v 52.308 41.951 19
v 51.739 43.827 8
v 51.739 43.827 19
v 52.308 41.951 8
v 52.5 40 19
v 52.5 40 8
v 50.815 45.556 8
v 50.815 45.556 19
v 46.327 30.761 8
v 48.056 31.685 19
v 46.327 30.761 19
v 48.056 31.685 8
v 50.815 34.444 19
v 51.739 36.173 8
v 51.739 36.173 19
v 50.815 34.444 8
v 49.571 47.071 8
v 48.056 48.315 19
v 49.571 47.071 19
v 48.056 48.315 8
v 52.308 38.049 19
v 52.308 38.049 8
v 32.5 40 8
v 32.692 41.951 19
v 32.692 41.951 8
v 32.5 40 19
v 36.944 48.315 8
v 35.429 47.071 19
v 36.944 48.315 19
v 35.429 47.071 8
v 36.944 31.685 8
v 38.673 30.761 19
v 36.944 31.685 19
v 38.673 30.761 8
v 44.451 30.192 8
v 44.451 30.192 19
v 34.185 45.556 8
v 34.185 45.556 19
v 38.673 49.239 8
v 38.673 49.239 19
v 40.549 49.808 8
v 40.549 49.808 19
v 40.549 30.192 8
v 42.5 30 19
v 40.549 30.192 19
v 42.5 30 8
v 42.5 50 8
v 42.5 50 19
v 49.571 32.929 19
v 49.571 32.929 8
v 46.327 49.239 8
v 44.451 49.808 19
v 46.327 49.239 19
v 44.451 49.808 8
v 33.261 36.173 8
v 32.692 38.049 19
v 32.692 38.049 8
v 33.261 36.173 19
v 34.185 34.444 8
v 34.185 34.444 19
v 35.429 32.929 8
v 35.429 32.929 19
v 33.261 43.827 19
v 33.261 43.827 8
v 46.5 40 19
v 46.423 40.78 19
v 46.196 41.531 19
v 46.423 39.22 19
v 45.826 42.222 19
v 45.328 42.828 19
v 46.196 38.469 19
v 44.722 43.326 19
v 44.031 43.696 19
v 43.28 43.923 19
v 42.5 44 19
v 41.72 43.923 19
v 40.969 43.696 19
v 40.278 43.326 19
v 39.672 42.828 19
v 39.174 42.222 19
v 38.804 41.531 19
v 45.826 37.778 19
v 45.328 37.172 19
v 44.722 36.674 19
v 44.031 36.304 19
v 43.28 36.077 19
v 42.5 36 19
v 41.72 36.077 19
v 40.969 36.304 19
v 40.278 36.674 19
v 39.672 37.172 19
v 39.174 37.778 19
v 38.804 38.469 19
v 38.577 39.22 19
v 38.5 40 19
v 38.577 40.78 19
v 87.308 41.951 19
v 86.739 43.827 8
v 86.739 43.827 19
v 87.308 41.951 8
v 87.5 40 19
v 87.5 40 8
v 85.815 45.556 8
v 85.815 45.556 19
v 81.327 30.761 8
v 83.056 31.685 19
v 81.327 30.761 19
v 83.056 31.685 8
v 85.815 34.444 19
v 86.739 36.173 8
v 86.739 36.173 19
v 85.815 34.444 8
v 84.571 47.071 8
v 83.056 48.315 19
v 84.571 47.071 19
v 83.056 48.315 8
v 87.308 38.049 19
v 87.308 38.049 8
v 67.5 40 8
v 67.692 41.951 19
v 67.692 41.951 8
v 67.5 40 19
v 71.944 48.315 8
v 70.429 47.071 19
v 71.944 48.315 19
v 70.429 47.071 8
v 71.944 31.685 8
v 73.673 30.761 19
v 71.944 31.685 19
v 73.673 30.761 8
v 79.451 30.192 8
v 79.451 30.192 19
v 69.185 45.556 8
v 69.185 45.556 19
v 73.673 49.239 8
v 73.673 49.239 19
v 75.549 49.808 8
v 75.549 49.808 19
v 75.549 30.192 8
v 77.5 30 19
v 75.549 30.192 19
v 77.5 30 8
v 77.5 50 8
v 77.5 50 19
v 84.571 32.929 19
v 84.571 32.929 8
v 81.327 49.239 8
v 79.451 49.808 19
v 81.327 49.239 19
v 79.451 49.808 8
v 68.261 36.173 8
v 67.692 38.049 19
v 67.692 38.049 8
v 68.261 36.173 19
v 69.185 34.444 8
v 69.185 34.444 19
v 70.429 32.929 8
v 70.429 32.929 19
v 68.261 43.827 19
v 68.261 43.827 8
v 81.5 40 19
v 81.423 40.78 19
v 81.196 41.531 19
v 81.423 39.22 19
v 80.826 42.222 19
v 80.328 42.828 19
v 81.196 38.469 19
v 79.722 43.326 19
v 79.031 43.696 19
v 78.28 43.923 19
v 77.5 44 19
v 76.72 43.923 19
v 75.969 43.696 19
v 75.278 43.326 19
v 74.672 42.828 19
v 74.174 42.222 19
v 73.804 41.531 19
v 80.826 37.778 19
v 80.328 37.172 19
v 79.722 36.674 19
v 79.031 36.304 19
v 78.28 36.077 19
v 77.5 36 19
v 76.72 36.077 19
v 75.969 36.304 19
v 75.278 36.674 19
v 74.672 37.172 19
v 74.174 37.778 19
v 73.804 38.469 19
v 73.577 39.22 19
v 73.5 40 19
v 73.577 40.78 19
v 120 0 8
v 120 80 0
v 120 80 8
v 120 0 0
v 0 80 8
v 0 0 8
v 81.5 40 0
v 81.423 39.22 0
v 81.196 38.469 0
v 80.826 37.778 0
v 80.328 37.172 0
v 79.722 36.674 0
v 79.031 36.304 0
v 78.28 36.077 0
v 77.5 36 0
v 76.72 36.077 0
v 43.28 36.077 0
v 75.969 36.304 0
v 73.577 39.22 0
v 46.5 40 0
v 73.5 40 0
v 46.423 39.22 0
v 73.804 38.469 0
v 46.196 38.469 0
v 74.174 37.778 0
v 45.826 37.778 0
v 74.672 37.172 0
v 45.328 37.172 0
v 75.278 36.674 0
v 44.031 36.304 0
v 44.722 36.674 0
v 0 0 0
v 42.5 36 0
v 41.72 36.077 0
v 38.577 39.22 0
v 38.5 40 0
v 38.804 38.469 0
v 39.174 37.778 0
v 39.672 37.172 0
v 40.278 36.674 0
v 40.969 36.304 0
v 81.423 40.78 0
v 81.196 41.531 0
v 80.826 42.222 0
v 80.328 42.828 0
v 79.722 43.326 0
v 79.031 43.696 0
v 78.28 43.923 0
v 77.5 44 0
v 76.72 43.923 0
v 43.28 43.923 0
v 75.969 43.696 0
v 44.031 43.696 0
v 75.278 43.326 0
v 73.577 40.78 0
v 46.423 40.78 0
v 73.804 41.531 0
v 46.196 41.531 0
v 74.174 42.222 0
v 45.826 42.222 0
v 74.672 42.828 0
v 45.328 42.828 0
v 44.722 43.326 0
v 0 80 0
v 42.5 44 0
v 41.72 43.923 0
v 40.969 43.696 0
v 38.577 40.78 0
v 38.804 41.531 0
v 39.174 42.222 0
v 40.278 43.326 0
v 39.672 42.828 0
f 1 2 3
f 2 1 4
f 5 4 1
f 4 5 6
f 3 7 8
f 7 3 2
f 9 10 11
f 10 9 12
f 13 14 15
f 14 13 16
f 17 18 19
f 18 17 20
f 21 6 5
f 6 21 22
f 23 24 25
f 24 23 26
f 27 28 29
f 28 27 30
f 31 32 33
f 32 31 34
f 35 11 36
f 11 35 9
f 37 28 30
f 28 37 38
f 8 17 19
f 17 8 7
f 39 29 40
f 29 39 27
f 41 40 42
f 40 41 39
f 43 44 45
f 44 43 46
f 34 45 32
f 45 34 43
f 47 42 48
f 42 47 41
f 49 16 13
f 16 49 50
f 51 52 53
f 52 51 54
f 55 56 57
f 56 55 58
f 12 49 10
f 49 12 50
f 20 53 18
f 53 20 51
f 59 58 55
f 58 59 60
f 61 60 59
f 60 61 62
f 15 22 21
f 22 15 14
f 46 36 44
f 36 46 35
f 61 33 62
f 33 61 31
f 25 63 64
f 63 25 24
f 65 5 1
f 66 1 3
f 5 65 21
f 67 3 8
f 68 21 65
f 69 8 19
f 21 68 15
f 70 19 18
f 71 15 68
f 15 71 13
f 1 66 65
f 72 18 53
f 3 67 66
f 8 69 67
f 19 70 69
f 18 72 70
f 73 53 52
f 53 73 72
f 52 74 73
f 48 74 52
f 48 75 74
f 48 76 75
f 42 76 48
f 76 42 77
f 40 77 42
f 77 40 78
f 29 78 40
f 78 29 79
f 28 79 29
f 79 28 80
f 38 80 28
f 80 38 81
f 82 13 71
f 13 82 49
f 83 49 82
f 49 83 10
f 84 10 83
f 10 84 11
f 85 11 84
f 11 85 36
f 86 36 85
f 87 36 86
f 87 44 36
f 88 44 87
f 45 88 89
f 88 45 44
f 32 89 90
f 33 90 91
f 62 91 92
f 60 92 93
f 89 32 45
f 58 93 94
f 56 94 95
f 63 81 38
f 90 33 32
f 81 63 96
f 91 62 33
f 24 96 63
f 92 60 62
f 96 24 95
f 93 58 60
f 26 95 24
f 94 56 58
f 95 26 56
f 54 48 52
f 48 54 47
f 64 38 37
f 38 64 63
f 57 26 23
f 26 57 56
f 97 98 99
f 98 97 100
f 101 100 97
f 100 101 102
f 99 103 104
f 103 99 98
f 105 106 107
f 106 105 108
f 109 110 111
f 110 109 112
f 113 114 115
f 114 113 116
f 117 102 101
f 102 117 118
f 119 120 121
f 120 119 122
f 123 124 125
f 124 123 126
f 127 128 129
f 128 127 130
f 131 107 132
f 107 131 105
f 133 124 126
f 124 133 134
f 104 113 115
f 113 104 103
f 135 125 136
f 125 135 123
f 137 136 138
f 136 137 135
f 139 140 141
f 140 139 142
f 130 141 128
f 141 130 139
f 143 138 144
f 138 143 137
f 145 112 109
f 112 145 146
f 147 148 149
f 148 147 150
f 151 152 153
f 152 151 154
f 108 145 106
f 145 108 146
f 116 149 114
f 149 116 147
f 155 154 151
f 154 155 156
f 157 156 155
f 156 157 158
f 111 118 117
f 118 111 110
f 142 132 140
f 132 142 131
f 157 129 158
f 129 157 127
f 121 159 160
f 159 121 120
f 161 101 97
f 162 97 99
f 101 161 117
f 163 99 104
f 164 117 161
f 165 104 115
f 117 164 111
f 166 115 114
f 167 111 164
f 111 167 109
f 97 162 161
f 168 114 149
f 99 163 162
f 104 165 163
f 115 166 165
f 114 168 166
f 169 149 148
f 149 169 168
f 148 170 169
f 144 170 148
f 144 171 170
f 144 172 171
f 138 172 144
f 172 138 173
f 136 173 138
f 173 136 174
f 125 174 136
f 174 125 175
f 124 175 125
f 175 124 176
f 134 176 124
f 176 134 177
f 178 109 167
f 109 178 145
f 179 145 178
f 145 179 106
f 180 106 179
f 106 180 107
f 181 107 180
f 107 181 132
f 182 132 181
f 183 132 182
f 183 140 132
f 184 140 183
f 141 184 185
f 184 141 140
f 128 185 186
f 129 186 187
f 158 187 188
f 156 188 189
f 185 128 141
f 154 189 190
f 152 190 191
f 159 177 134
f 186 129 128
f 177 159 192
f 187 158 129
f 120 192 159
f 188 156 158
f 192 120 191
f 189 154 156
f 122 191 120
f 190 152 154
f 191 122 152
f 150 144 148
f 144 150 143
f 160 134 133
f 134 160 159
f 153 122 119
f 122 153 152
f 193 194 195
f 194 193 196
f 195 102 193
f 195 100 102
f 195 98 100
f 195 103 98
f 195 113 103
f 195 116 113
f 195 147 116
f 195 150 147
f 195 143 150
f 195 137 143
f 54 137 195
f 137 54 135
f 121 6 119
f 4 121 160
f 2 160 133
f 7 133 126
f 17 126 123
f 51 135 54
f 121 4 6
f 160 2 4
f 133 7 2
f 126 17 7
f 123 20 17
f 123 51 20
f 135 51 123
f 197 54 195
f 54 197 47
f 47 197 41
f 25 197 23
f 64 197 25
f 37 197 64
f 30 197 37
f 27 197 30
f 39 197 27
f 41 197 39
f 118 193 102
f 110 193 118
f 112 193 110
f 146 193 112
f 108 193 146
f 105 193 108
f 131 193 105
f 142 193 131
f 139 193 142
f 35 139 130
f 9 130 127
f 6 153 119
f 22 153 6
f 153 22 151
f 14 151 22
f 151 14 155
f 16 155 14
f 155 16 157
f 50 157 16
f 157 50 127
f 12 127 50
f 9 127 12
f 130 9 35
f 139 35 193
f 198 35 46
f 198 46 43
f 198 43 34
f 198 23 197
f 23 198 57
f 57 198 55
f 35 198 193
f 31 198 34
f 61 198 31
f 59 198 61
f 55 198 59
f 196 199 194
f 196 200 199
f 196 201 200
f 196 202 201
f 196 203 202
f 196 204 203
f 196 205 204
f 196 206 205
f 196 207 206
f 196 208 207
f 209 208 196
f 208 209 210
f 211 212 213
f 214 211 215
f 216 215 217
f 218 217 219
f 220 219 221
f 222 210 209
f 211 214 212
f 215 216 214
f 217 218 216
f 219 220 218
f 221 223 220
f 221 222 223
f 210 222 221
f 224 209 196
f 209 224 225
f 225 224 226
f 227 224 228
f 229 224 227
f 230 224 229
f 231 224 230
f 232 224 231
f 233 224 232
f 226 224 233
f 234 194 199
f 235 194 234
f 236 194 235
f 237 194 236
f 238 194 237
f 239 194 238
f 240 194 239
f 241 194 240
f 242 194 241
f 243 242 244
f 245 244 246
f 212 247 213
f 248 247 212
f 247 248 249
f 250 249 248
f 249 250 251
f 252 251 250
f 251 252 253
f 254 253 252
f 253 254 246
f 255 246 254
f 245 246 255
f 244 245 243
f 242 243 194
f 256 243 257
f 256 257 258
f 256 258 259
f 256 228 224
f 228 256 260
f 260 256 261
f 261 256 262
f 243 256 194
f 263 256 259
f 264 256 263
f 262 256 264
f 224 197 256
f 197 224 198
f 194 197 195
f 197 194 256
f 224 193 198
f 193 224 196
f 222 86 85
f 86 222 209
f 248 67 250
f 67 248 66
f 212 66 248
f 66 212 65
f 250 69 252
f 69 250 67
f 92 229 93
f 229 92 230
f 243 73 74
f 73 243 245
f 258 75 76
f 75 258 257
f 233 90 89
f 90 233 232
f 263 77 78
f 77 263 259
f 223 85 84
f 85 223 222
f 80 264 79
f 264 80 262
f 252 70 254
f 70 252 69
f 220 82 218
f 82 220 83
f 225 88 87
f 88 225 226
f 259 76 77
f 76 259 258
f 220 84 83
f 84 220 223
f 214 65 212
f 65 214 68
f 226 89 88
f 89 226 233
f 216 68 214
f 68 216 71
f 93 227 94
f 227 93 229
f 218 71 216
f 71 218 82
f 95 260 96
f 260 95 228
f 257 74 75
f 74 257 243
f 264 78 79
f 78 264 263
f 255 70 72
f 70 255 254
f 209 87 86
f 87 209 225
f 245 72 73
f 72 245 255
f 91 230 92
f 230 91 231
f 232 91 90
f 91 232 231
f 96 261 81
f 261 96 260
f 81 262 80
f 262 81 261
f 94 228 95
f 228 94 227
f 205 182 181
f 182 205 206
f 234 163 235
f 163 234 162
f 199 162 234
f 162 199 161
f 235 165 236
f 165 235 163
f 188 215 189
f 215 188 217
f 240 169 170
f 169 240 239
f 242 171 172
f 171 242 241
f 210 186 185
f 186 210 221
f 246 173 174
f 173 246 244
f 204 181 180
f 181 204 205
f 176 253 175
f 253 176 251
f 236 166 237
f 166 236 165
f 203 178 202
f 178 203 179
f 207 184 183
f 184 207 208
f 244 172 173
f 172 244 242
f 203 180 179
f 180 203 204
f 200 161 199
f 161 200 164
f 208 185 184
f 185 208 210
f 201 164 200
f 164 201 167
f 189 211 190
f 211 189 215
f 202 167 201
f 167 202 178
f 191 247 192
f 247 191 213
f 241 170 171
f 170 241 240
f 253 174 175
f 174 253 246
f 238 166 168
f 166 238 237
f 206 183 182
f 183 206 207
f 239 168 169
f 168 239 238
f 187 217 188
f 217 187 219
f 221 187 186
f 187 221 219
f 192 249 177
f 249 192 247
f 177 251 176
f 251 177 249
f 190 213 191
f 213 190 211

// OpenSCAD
$fn = 32;

// ----------------------------------------------------------------------
// Drill jig: two_boss jig
// ----------------------------------------------------------------------

// --- parameters (mm) ---
plate_l = 120;            // plate length, X
plate_w = 80;             // plate width, Y
plate_t = 8;              // plate thickness
boss_d = 20;              // guide boss diameter
boss_h = 12;              // boss height above the plate
guide_d = 8;              // guide hole diameter
boss_pitch = 35;          // boss pitch

n_boss = 2;  // guide bosses
boss_x0 = (plate_l - (n_boss - 1) * boss_pitch) / 2;  // first boss X
boss_top = plate_t - 1 + boss_h;  // boss crown height
total_h = boss_top;  // overall height

difference() {
  union() {
  cube([plate_l, plate_w, plate_t]);
  for (i = [0 : n_boss - 1])
    translate([boss_x0 + i * boss_pitch, plate_w / 2, plate_t - 1])
      cylinder(h = boss_h, d = boss_d);
  }
  for (i = [0 : n_boss - 1])
    translate([boss_x0 + i * boss_pitch, plate_w / 2, -1])
      cylinder(h = plate_t + boss_h, d = guide_d);
}
